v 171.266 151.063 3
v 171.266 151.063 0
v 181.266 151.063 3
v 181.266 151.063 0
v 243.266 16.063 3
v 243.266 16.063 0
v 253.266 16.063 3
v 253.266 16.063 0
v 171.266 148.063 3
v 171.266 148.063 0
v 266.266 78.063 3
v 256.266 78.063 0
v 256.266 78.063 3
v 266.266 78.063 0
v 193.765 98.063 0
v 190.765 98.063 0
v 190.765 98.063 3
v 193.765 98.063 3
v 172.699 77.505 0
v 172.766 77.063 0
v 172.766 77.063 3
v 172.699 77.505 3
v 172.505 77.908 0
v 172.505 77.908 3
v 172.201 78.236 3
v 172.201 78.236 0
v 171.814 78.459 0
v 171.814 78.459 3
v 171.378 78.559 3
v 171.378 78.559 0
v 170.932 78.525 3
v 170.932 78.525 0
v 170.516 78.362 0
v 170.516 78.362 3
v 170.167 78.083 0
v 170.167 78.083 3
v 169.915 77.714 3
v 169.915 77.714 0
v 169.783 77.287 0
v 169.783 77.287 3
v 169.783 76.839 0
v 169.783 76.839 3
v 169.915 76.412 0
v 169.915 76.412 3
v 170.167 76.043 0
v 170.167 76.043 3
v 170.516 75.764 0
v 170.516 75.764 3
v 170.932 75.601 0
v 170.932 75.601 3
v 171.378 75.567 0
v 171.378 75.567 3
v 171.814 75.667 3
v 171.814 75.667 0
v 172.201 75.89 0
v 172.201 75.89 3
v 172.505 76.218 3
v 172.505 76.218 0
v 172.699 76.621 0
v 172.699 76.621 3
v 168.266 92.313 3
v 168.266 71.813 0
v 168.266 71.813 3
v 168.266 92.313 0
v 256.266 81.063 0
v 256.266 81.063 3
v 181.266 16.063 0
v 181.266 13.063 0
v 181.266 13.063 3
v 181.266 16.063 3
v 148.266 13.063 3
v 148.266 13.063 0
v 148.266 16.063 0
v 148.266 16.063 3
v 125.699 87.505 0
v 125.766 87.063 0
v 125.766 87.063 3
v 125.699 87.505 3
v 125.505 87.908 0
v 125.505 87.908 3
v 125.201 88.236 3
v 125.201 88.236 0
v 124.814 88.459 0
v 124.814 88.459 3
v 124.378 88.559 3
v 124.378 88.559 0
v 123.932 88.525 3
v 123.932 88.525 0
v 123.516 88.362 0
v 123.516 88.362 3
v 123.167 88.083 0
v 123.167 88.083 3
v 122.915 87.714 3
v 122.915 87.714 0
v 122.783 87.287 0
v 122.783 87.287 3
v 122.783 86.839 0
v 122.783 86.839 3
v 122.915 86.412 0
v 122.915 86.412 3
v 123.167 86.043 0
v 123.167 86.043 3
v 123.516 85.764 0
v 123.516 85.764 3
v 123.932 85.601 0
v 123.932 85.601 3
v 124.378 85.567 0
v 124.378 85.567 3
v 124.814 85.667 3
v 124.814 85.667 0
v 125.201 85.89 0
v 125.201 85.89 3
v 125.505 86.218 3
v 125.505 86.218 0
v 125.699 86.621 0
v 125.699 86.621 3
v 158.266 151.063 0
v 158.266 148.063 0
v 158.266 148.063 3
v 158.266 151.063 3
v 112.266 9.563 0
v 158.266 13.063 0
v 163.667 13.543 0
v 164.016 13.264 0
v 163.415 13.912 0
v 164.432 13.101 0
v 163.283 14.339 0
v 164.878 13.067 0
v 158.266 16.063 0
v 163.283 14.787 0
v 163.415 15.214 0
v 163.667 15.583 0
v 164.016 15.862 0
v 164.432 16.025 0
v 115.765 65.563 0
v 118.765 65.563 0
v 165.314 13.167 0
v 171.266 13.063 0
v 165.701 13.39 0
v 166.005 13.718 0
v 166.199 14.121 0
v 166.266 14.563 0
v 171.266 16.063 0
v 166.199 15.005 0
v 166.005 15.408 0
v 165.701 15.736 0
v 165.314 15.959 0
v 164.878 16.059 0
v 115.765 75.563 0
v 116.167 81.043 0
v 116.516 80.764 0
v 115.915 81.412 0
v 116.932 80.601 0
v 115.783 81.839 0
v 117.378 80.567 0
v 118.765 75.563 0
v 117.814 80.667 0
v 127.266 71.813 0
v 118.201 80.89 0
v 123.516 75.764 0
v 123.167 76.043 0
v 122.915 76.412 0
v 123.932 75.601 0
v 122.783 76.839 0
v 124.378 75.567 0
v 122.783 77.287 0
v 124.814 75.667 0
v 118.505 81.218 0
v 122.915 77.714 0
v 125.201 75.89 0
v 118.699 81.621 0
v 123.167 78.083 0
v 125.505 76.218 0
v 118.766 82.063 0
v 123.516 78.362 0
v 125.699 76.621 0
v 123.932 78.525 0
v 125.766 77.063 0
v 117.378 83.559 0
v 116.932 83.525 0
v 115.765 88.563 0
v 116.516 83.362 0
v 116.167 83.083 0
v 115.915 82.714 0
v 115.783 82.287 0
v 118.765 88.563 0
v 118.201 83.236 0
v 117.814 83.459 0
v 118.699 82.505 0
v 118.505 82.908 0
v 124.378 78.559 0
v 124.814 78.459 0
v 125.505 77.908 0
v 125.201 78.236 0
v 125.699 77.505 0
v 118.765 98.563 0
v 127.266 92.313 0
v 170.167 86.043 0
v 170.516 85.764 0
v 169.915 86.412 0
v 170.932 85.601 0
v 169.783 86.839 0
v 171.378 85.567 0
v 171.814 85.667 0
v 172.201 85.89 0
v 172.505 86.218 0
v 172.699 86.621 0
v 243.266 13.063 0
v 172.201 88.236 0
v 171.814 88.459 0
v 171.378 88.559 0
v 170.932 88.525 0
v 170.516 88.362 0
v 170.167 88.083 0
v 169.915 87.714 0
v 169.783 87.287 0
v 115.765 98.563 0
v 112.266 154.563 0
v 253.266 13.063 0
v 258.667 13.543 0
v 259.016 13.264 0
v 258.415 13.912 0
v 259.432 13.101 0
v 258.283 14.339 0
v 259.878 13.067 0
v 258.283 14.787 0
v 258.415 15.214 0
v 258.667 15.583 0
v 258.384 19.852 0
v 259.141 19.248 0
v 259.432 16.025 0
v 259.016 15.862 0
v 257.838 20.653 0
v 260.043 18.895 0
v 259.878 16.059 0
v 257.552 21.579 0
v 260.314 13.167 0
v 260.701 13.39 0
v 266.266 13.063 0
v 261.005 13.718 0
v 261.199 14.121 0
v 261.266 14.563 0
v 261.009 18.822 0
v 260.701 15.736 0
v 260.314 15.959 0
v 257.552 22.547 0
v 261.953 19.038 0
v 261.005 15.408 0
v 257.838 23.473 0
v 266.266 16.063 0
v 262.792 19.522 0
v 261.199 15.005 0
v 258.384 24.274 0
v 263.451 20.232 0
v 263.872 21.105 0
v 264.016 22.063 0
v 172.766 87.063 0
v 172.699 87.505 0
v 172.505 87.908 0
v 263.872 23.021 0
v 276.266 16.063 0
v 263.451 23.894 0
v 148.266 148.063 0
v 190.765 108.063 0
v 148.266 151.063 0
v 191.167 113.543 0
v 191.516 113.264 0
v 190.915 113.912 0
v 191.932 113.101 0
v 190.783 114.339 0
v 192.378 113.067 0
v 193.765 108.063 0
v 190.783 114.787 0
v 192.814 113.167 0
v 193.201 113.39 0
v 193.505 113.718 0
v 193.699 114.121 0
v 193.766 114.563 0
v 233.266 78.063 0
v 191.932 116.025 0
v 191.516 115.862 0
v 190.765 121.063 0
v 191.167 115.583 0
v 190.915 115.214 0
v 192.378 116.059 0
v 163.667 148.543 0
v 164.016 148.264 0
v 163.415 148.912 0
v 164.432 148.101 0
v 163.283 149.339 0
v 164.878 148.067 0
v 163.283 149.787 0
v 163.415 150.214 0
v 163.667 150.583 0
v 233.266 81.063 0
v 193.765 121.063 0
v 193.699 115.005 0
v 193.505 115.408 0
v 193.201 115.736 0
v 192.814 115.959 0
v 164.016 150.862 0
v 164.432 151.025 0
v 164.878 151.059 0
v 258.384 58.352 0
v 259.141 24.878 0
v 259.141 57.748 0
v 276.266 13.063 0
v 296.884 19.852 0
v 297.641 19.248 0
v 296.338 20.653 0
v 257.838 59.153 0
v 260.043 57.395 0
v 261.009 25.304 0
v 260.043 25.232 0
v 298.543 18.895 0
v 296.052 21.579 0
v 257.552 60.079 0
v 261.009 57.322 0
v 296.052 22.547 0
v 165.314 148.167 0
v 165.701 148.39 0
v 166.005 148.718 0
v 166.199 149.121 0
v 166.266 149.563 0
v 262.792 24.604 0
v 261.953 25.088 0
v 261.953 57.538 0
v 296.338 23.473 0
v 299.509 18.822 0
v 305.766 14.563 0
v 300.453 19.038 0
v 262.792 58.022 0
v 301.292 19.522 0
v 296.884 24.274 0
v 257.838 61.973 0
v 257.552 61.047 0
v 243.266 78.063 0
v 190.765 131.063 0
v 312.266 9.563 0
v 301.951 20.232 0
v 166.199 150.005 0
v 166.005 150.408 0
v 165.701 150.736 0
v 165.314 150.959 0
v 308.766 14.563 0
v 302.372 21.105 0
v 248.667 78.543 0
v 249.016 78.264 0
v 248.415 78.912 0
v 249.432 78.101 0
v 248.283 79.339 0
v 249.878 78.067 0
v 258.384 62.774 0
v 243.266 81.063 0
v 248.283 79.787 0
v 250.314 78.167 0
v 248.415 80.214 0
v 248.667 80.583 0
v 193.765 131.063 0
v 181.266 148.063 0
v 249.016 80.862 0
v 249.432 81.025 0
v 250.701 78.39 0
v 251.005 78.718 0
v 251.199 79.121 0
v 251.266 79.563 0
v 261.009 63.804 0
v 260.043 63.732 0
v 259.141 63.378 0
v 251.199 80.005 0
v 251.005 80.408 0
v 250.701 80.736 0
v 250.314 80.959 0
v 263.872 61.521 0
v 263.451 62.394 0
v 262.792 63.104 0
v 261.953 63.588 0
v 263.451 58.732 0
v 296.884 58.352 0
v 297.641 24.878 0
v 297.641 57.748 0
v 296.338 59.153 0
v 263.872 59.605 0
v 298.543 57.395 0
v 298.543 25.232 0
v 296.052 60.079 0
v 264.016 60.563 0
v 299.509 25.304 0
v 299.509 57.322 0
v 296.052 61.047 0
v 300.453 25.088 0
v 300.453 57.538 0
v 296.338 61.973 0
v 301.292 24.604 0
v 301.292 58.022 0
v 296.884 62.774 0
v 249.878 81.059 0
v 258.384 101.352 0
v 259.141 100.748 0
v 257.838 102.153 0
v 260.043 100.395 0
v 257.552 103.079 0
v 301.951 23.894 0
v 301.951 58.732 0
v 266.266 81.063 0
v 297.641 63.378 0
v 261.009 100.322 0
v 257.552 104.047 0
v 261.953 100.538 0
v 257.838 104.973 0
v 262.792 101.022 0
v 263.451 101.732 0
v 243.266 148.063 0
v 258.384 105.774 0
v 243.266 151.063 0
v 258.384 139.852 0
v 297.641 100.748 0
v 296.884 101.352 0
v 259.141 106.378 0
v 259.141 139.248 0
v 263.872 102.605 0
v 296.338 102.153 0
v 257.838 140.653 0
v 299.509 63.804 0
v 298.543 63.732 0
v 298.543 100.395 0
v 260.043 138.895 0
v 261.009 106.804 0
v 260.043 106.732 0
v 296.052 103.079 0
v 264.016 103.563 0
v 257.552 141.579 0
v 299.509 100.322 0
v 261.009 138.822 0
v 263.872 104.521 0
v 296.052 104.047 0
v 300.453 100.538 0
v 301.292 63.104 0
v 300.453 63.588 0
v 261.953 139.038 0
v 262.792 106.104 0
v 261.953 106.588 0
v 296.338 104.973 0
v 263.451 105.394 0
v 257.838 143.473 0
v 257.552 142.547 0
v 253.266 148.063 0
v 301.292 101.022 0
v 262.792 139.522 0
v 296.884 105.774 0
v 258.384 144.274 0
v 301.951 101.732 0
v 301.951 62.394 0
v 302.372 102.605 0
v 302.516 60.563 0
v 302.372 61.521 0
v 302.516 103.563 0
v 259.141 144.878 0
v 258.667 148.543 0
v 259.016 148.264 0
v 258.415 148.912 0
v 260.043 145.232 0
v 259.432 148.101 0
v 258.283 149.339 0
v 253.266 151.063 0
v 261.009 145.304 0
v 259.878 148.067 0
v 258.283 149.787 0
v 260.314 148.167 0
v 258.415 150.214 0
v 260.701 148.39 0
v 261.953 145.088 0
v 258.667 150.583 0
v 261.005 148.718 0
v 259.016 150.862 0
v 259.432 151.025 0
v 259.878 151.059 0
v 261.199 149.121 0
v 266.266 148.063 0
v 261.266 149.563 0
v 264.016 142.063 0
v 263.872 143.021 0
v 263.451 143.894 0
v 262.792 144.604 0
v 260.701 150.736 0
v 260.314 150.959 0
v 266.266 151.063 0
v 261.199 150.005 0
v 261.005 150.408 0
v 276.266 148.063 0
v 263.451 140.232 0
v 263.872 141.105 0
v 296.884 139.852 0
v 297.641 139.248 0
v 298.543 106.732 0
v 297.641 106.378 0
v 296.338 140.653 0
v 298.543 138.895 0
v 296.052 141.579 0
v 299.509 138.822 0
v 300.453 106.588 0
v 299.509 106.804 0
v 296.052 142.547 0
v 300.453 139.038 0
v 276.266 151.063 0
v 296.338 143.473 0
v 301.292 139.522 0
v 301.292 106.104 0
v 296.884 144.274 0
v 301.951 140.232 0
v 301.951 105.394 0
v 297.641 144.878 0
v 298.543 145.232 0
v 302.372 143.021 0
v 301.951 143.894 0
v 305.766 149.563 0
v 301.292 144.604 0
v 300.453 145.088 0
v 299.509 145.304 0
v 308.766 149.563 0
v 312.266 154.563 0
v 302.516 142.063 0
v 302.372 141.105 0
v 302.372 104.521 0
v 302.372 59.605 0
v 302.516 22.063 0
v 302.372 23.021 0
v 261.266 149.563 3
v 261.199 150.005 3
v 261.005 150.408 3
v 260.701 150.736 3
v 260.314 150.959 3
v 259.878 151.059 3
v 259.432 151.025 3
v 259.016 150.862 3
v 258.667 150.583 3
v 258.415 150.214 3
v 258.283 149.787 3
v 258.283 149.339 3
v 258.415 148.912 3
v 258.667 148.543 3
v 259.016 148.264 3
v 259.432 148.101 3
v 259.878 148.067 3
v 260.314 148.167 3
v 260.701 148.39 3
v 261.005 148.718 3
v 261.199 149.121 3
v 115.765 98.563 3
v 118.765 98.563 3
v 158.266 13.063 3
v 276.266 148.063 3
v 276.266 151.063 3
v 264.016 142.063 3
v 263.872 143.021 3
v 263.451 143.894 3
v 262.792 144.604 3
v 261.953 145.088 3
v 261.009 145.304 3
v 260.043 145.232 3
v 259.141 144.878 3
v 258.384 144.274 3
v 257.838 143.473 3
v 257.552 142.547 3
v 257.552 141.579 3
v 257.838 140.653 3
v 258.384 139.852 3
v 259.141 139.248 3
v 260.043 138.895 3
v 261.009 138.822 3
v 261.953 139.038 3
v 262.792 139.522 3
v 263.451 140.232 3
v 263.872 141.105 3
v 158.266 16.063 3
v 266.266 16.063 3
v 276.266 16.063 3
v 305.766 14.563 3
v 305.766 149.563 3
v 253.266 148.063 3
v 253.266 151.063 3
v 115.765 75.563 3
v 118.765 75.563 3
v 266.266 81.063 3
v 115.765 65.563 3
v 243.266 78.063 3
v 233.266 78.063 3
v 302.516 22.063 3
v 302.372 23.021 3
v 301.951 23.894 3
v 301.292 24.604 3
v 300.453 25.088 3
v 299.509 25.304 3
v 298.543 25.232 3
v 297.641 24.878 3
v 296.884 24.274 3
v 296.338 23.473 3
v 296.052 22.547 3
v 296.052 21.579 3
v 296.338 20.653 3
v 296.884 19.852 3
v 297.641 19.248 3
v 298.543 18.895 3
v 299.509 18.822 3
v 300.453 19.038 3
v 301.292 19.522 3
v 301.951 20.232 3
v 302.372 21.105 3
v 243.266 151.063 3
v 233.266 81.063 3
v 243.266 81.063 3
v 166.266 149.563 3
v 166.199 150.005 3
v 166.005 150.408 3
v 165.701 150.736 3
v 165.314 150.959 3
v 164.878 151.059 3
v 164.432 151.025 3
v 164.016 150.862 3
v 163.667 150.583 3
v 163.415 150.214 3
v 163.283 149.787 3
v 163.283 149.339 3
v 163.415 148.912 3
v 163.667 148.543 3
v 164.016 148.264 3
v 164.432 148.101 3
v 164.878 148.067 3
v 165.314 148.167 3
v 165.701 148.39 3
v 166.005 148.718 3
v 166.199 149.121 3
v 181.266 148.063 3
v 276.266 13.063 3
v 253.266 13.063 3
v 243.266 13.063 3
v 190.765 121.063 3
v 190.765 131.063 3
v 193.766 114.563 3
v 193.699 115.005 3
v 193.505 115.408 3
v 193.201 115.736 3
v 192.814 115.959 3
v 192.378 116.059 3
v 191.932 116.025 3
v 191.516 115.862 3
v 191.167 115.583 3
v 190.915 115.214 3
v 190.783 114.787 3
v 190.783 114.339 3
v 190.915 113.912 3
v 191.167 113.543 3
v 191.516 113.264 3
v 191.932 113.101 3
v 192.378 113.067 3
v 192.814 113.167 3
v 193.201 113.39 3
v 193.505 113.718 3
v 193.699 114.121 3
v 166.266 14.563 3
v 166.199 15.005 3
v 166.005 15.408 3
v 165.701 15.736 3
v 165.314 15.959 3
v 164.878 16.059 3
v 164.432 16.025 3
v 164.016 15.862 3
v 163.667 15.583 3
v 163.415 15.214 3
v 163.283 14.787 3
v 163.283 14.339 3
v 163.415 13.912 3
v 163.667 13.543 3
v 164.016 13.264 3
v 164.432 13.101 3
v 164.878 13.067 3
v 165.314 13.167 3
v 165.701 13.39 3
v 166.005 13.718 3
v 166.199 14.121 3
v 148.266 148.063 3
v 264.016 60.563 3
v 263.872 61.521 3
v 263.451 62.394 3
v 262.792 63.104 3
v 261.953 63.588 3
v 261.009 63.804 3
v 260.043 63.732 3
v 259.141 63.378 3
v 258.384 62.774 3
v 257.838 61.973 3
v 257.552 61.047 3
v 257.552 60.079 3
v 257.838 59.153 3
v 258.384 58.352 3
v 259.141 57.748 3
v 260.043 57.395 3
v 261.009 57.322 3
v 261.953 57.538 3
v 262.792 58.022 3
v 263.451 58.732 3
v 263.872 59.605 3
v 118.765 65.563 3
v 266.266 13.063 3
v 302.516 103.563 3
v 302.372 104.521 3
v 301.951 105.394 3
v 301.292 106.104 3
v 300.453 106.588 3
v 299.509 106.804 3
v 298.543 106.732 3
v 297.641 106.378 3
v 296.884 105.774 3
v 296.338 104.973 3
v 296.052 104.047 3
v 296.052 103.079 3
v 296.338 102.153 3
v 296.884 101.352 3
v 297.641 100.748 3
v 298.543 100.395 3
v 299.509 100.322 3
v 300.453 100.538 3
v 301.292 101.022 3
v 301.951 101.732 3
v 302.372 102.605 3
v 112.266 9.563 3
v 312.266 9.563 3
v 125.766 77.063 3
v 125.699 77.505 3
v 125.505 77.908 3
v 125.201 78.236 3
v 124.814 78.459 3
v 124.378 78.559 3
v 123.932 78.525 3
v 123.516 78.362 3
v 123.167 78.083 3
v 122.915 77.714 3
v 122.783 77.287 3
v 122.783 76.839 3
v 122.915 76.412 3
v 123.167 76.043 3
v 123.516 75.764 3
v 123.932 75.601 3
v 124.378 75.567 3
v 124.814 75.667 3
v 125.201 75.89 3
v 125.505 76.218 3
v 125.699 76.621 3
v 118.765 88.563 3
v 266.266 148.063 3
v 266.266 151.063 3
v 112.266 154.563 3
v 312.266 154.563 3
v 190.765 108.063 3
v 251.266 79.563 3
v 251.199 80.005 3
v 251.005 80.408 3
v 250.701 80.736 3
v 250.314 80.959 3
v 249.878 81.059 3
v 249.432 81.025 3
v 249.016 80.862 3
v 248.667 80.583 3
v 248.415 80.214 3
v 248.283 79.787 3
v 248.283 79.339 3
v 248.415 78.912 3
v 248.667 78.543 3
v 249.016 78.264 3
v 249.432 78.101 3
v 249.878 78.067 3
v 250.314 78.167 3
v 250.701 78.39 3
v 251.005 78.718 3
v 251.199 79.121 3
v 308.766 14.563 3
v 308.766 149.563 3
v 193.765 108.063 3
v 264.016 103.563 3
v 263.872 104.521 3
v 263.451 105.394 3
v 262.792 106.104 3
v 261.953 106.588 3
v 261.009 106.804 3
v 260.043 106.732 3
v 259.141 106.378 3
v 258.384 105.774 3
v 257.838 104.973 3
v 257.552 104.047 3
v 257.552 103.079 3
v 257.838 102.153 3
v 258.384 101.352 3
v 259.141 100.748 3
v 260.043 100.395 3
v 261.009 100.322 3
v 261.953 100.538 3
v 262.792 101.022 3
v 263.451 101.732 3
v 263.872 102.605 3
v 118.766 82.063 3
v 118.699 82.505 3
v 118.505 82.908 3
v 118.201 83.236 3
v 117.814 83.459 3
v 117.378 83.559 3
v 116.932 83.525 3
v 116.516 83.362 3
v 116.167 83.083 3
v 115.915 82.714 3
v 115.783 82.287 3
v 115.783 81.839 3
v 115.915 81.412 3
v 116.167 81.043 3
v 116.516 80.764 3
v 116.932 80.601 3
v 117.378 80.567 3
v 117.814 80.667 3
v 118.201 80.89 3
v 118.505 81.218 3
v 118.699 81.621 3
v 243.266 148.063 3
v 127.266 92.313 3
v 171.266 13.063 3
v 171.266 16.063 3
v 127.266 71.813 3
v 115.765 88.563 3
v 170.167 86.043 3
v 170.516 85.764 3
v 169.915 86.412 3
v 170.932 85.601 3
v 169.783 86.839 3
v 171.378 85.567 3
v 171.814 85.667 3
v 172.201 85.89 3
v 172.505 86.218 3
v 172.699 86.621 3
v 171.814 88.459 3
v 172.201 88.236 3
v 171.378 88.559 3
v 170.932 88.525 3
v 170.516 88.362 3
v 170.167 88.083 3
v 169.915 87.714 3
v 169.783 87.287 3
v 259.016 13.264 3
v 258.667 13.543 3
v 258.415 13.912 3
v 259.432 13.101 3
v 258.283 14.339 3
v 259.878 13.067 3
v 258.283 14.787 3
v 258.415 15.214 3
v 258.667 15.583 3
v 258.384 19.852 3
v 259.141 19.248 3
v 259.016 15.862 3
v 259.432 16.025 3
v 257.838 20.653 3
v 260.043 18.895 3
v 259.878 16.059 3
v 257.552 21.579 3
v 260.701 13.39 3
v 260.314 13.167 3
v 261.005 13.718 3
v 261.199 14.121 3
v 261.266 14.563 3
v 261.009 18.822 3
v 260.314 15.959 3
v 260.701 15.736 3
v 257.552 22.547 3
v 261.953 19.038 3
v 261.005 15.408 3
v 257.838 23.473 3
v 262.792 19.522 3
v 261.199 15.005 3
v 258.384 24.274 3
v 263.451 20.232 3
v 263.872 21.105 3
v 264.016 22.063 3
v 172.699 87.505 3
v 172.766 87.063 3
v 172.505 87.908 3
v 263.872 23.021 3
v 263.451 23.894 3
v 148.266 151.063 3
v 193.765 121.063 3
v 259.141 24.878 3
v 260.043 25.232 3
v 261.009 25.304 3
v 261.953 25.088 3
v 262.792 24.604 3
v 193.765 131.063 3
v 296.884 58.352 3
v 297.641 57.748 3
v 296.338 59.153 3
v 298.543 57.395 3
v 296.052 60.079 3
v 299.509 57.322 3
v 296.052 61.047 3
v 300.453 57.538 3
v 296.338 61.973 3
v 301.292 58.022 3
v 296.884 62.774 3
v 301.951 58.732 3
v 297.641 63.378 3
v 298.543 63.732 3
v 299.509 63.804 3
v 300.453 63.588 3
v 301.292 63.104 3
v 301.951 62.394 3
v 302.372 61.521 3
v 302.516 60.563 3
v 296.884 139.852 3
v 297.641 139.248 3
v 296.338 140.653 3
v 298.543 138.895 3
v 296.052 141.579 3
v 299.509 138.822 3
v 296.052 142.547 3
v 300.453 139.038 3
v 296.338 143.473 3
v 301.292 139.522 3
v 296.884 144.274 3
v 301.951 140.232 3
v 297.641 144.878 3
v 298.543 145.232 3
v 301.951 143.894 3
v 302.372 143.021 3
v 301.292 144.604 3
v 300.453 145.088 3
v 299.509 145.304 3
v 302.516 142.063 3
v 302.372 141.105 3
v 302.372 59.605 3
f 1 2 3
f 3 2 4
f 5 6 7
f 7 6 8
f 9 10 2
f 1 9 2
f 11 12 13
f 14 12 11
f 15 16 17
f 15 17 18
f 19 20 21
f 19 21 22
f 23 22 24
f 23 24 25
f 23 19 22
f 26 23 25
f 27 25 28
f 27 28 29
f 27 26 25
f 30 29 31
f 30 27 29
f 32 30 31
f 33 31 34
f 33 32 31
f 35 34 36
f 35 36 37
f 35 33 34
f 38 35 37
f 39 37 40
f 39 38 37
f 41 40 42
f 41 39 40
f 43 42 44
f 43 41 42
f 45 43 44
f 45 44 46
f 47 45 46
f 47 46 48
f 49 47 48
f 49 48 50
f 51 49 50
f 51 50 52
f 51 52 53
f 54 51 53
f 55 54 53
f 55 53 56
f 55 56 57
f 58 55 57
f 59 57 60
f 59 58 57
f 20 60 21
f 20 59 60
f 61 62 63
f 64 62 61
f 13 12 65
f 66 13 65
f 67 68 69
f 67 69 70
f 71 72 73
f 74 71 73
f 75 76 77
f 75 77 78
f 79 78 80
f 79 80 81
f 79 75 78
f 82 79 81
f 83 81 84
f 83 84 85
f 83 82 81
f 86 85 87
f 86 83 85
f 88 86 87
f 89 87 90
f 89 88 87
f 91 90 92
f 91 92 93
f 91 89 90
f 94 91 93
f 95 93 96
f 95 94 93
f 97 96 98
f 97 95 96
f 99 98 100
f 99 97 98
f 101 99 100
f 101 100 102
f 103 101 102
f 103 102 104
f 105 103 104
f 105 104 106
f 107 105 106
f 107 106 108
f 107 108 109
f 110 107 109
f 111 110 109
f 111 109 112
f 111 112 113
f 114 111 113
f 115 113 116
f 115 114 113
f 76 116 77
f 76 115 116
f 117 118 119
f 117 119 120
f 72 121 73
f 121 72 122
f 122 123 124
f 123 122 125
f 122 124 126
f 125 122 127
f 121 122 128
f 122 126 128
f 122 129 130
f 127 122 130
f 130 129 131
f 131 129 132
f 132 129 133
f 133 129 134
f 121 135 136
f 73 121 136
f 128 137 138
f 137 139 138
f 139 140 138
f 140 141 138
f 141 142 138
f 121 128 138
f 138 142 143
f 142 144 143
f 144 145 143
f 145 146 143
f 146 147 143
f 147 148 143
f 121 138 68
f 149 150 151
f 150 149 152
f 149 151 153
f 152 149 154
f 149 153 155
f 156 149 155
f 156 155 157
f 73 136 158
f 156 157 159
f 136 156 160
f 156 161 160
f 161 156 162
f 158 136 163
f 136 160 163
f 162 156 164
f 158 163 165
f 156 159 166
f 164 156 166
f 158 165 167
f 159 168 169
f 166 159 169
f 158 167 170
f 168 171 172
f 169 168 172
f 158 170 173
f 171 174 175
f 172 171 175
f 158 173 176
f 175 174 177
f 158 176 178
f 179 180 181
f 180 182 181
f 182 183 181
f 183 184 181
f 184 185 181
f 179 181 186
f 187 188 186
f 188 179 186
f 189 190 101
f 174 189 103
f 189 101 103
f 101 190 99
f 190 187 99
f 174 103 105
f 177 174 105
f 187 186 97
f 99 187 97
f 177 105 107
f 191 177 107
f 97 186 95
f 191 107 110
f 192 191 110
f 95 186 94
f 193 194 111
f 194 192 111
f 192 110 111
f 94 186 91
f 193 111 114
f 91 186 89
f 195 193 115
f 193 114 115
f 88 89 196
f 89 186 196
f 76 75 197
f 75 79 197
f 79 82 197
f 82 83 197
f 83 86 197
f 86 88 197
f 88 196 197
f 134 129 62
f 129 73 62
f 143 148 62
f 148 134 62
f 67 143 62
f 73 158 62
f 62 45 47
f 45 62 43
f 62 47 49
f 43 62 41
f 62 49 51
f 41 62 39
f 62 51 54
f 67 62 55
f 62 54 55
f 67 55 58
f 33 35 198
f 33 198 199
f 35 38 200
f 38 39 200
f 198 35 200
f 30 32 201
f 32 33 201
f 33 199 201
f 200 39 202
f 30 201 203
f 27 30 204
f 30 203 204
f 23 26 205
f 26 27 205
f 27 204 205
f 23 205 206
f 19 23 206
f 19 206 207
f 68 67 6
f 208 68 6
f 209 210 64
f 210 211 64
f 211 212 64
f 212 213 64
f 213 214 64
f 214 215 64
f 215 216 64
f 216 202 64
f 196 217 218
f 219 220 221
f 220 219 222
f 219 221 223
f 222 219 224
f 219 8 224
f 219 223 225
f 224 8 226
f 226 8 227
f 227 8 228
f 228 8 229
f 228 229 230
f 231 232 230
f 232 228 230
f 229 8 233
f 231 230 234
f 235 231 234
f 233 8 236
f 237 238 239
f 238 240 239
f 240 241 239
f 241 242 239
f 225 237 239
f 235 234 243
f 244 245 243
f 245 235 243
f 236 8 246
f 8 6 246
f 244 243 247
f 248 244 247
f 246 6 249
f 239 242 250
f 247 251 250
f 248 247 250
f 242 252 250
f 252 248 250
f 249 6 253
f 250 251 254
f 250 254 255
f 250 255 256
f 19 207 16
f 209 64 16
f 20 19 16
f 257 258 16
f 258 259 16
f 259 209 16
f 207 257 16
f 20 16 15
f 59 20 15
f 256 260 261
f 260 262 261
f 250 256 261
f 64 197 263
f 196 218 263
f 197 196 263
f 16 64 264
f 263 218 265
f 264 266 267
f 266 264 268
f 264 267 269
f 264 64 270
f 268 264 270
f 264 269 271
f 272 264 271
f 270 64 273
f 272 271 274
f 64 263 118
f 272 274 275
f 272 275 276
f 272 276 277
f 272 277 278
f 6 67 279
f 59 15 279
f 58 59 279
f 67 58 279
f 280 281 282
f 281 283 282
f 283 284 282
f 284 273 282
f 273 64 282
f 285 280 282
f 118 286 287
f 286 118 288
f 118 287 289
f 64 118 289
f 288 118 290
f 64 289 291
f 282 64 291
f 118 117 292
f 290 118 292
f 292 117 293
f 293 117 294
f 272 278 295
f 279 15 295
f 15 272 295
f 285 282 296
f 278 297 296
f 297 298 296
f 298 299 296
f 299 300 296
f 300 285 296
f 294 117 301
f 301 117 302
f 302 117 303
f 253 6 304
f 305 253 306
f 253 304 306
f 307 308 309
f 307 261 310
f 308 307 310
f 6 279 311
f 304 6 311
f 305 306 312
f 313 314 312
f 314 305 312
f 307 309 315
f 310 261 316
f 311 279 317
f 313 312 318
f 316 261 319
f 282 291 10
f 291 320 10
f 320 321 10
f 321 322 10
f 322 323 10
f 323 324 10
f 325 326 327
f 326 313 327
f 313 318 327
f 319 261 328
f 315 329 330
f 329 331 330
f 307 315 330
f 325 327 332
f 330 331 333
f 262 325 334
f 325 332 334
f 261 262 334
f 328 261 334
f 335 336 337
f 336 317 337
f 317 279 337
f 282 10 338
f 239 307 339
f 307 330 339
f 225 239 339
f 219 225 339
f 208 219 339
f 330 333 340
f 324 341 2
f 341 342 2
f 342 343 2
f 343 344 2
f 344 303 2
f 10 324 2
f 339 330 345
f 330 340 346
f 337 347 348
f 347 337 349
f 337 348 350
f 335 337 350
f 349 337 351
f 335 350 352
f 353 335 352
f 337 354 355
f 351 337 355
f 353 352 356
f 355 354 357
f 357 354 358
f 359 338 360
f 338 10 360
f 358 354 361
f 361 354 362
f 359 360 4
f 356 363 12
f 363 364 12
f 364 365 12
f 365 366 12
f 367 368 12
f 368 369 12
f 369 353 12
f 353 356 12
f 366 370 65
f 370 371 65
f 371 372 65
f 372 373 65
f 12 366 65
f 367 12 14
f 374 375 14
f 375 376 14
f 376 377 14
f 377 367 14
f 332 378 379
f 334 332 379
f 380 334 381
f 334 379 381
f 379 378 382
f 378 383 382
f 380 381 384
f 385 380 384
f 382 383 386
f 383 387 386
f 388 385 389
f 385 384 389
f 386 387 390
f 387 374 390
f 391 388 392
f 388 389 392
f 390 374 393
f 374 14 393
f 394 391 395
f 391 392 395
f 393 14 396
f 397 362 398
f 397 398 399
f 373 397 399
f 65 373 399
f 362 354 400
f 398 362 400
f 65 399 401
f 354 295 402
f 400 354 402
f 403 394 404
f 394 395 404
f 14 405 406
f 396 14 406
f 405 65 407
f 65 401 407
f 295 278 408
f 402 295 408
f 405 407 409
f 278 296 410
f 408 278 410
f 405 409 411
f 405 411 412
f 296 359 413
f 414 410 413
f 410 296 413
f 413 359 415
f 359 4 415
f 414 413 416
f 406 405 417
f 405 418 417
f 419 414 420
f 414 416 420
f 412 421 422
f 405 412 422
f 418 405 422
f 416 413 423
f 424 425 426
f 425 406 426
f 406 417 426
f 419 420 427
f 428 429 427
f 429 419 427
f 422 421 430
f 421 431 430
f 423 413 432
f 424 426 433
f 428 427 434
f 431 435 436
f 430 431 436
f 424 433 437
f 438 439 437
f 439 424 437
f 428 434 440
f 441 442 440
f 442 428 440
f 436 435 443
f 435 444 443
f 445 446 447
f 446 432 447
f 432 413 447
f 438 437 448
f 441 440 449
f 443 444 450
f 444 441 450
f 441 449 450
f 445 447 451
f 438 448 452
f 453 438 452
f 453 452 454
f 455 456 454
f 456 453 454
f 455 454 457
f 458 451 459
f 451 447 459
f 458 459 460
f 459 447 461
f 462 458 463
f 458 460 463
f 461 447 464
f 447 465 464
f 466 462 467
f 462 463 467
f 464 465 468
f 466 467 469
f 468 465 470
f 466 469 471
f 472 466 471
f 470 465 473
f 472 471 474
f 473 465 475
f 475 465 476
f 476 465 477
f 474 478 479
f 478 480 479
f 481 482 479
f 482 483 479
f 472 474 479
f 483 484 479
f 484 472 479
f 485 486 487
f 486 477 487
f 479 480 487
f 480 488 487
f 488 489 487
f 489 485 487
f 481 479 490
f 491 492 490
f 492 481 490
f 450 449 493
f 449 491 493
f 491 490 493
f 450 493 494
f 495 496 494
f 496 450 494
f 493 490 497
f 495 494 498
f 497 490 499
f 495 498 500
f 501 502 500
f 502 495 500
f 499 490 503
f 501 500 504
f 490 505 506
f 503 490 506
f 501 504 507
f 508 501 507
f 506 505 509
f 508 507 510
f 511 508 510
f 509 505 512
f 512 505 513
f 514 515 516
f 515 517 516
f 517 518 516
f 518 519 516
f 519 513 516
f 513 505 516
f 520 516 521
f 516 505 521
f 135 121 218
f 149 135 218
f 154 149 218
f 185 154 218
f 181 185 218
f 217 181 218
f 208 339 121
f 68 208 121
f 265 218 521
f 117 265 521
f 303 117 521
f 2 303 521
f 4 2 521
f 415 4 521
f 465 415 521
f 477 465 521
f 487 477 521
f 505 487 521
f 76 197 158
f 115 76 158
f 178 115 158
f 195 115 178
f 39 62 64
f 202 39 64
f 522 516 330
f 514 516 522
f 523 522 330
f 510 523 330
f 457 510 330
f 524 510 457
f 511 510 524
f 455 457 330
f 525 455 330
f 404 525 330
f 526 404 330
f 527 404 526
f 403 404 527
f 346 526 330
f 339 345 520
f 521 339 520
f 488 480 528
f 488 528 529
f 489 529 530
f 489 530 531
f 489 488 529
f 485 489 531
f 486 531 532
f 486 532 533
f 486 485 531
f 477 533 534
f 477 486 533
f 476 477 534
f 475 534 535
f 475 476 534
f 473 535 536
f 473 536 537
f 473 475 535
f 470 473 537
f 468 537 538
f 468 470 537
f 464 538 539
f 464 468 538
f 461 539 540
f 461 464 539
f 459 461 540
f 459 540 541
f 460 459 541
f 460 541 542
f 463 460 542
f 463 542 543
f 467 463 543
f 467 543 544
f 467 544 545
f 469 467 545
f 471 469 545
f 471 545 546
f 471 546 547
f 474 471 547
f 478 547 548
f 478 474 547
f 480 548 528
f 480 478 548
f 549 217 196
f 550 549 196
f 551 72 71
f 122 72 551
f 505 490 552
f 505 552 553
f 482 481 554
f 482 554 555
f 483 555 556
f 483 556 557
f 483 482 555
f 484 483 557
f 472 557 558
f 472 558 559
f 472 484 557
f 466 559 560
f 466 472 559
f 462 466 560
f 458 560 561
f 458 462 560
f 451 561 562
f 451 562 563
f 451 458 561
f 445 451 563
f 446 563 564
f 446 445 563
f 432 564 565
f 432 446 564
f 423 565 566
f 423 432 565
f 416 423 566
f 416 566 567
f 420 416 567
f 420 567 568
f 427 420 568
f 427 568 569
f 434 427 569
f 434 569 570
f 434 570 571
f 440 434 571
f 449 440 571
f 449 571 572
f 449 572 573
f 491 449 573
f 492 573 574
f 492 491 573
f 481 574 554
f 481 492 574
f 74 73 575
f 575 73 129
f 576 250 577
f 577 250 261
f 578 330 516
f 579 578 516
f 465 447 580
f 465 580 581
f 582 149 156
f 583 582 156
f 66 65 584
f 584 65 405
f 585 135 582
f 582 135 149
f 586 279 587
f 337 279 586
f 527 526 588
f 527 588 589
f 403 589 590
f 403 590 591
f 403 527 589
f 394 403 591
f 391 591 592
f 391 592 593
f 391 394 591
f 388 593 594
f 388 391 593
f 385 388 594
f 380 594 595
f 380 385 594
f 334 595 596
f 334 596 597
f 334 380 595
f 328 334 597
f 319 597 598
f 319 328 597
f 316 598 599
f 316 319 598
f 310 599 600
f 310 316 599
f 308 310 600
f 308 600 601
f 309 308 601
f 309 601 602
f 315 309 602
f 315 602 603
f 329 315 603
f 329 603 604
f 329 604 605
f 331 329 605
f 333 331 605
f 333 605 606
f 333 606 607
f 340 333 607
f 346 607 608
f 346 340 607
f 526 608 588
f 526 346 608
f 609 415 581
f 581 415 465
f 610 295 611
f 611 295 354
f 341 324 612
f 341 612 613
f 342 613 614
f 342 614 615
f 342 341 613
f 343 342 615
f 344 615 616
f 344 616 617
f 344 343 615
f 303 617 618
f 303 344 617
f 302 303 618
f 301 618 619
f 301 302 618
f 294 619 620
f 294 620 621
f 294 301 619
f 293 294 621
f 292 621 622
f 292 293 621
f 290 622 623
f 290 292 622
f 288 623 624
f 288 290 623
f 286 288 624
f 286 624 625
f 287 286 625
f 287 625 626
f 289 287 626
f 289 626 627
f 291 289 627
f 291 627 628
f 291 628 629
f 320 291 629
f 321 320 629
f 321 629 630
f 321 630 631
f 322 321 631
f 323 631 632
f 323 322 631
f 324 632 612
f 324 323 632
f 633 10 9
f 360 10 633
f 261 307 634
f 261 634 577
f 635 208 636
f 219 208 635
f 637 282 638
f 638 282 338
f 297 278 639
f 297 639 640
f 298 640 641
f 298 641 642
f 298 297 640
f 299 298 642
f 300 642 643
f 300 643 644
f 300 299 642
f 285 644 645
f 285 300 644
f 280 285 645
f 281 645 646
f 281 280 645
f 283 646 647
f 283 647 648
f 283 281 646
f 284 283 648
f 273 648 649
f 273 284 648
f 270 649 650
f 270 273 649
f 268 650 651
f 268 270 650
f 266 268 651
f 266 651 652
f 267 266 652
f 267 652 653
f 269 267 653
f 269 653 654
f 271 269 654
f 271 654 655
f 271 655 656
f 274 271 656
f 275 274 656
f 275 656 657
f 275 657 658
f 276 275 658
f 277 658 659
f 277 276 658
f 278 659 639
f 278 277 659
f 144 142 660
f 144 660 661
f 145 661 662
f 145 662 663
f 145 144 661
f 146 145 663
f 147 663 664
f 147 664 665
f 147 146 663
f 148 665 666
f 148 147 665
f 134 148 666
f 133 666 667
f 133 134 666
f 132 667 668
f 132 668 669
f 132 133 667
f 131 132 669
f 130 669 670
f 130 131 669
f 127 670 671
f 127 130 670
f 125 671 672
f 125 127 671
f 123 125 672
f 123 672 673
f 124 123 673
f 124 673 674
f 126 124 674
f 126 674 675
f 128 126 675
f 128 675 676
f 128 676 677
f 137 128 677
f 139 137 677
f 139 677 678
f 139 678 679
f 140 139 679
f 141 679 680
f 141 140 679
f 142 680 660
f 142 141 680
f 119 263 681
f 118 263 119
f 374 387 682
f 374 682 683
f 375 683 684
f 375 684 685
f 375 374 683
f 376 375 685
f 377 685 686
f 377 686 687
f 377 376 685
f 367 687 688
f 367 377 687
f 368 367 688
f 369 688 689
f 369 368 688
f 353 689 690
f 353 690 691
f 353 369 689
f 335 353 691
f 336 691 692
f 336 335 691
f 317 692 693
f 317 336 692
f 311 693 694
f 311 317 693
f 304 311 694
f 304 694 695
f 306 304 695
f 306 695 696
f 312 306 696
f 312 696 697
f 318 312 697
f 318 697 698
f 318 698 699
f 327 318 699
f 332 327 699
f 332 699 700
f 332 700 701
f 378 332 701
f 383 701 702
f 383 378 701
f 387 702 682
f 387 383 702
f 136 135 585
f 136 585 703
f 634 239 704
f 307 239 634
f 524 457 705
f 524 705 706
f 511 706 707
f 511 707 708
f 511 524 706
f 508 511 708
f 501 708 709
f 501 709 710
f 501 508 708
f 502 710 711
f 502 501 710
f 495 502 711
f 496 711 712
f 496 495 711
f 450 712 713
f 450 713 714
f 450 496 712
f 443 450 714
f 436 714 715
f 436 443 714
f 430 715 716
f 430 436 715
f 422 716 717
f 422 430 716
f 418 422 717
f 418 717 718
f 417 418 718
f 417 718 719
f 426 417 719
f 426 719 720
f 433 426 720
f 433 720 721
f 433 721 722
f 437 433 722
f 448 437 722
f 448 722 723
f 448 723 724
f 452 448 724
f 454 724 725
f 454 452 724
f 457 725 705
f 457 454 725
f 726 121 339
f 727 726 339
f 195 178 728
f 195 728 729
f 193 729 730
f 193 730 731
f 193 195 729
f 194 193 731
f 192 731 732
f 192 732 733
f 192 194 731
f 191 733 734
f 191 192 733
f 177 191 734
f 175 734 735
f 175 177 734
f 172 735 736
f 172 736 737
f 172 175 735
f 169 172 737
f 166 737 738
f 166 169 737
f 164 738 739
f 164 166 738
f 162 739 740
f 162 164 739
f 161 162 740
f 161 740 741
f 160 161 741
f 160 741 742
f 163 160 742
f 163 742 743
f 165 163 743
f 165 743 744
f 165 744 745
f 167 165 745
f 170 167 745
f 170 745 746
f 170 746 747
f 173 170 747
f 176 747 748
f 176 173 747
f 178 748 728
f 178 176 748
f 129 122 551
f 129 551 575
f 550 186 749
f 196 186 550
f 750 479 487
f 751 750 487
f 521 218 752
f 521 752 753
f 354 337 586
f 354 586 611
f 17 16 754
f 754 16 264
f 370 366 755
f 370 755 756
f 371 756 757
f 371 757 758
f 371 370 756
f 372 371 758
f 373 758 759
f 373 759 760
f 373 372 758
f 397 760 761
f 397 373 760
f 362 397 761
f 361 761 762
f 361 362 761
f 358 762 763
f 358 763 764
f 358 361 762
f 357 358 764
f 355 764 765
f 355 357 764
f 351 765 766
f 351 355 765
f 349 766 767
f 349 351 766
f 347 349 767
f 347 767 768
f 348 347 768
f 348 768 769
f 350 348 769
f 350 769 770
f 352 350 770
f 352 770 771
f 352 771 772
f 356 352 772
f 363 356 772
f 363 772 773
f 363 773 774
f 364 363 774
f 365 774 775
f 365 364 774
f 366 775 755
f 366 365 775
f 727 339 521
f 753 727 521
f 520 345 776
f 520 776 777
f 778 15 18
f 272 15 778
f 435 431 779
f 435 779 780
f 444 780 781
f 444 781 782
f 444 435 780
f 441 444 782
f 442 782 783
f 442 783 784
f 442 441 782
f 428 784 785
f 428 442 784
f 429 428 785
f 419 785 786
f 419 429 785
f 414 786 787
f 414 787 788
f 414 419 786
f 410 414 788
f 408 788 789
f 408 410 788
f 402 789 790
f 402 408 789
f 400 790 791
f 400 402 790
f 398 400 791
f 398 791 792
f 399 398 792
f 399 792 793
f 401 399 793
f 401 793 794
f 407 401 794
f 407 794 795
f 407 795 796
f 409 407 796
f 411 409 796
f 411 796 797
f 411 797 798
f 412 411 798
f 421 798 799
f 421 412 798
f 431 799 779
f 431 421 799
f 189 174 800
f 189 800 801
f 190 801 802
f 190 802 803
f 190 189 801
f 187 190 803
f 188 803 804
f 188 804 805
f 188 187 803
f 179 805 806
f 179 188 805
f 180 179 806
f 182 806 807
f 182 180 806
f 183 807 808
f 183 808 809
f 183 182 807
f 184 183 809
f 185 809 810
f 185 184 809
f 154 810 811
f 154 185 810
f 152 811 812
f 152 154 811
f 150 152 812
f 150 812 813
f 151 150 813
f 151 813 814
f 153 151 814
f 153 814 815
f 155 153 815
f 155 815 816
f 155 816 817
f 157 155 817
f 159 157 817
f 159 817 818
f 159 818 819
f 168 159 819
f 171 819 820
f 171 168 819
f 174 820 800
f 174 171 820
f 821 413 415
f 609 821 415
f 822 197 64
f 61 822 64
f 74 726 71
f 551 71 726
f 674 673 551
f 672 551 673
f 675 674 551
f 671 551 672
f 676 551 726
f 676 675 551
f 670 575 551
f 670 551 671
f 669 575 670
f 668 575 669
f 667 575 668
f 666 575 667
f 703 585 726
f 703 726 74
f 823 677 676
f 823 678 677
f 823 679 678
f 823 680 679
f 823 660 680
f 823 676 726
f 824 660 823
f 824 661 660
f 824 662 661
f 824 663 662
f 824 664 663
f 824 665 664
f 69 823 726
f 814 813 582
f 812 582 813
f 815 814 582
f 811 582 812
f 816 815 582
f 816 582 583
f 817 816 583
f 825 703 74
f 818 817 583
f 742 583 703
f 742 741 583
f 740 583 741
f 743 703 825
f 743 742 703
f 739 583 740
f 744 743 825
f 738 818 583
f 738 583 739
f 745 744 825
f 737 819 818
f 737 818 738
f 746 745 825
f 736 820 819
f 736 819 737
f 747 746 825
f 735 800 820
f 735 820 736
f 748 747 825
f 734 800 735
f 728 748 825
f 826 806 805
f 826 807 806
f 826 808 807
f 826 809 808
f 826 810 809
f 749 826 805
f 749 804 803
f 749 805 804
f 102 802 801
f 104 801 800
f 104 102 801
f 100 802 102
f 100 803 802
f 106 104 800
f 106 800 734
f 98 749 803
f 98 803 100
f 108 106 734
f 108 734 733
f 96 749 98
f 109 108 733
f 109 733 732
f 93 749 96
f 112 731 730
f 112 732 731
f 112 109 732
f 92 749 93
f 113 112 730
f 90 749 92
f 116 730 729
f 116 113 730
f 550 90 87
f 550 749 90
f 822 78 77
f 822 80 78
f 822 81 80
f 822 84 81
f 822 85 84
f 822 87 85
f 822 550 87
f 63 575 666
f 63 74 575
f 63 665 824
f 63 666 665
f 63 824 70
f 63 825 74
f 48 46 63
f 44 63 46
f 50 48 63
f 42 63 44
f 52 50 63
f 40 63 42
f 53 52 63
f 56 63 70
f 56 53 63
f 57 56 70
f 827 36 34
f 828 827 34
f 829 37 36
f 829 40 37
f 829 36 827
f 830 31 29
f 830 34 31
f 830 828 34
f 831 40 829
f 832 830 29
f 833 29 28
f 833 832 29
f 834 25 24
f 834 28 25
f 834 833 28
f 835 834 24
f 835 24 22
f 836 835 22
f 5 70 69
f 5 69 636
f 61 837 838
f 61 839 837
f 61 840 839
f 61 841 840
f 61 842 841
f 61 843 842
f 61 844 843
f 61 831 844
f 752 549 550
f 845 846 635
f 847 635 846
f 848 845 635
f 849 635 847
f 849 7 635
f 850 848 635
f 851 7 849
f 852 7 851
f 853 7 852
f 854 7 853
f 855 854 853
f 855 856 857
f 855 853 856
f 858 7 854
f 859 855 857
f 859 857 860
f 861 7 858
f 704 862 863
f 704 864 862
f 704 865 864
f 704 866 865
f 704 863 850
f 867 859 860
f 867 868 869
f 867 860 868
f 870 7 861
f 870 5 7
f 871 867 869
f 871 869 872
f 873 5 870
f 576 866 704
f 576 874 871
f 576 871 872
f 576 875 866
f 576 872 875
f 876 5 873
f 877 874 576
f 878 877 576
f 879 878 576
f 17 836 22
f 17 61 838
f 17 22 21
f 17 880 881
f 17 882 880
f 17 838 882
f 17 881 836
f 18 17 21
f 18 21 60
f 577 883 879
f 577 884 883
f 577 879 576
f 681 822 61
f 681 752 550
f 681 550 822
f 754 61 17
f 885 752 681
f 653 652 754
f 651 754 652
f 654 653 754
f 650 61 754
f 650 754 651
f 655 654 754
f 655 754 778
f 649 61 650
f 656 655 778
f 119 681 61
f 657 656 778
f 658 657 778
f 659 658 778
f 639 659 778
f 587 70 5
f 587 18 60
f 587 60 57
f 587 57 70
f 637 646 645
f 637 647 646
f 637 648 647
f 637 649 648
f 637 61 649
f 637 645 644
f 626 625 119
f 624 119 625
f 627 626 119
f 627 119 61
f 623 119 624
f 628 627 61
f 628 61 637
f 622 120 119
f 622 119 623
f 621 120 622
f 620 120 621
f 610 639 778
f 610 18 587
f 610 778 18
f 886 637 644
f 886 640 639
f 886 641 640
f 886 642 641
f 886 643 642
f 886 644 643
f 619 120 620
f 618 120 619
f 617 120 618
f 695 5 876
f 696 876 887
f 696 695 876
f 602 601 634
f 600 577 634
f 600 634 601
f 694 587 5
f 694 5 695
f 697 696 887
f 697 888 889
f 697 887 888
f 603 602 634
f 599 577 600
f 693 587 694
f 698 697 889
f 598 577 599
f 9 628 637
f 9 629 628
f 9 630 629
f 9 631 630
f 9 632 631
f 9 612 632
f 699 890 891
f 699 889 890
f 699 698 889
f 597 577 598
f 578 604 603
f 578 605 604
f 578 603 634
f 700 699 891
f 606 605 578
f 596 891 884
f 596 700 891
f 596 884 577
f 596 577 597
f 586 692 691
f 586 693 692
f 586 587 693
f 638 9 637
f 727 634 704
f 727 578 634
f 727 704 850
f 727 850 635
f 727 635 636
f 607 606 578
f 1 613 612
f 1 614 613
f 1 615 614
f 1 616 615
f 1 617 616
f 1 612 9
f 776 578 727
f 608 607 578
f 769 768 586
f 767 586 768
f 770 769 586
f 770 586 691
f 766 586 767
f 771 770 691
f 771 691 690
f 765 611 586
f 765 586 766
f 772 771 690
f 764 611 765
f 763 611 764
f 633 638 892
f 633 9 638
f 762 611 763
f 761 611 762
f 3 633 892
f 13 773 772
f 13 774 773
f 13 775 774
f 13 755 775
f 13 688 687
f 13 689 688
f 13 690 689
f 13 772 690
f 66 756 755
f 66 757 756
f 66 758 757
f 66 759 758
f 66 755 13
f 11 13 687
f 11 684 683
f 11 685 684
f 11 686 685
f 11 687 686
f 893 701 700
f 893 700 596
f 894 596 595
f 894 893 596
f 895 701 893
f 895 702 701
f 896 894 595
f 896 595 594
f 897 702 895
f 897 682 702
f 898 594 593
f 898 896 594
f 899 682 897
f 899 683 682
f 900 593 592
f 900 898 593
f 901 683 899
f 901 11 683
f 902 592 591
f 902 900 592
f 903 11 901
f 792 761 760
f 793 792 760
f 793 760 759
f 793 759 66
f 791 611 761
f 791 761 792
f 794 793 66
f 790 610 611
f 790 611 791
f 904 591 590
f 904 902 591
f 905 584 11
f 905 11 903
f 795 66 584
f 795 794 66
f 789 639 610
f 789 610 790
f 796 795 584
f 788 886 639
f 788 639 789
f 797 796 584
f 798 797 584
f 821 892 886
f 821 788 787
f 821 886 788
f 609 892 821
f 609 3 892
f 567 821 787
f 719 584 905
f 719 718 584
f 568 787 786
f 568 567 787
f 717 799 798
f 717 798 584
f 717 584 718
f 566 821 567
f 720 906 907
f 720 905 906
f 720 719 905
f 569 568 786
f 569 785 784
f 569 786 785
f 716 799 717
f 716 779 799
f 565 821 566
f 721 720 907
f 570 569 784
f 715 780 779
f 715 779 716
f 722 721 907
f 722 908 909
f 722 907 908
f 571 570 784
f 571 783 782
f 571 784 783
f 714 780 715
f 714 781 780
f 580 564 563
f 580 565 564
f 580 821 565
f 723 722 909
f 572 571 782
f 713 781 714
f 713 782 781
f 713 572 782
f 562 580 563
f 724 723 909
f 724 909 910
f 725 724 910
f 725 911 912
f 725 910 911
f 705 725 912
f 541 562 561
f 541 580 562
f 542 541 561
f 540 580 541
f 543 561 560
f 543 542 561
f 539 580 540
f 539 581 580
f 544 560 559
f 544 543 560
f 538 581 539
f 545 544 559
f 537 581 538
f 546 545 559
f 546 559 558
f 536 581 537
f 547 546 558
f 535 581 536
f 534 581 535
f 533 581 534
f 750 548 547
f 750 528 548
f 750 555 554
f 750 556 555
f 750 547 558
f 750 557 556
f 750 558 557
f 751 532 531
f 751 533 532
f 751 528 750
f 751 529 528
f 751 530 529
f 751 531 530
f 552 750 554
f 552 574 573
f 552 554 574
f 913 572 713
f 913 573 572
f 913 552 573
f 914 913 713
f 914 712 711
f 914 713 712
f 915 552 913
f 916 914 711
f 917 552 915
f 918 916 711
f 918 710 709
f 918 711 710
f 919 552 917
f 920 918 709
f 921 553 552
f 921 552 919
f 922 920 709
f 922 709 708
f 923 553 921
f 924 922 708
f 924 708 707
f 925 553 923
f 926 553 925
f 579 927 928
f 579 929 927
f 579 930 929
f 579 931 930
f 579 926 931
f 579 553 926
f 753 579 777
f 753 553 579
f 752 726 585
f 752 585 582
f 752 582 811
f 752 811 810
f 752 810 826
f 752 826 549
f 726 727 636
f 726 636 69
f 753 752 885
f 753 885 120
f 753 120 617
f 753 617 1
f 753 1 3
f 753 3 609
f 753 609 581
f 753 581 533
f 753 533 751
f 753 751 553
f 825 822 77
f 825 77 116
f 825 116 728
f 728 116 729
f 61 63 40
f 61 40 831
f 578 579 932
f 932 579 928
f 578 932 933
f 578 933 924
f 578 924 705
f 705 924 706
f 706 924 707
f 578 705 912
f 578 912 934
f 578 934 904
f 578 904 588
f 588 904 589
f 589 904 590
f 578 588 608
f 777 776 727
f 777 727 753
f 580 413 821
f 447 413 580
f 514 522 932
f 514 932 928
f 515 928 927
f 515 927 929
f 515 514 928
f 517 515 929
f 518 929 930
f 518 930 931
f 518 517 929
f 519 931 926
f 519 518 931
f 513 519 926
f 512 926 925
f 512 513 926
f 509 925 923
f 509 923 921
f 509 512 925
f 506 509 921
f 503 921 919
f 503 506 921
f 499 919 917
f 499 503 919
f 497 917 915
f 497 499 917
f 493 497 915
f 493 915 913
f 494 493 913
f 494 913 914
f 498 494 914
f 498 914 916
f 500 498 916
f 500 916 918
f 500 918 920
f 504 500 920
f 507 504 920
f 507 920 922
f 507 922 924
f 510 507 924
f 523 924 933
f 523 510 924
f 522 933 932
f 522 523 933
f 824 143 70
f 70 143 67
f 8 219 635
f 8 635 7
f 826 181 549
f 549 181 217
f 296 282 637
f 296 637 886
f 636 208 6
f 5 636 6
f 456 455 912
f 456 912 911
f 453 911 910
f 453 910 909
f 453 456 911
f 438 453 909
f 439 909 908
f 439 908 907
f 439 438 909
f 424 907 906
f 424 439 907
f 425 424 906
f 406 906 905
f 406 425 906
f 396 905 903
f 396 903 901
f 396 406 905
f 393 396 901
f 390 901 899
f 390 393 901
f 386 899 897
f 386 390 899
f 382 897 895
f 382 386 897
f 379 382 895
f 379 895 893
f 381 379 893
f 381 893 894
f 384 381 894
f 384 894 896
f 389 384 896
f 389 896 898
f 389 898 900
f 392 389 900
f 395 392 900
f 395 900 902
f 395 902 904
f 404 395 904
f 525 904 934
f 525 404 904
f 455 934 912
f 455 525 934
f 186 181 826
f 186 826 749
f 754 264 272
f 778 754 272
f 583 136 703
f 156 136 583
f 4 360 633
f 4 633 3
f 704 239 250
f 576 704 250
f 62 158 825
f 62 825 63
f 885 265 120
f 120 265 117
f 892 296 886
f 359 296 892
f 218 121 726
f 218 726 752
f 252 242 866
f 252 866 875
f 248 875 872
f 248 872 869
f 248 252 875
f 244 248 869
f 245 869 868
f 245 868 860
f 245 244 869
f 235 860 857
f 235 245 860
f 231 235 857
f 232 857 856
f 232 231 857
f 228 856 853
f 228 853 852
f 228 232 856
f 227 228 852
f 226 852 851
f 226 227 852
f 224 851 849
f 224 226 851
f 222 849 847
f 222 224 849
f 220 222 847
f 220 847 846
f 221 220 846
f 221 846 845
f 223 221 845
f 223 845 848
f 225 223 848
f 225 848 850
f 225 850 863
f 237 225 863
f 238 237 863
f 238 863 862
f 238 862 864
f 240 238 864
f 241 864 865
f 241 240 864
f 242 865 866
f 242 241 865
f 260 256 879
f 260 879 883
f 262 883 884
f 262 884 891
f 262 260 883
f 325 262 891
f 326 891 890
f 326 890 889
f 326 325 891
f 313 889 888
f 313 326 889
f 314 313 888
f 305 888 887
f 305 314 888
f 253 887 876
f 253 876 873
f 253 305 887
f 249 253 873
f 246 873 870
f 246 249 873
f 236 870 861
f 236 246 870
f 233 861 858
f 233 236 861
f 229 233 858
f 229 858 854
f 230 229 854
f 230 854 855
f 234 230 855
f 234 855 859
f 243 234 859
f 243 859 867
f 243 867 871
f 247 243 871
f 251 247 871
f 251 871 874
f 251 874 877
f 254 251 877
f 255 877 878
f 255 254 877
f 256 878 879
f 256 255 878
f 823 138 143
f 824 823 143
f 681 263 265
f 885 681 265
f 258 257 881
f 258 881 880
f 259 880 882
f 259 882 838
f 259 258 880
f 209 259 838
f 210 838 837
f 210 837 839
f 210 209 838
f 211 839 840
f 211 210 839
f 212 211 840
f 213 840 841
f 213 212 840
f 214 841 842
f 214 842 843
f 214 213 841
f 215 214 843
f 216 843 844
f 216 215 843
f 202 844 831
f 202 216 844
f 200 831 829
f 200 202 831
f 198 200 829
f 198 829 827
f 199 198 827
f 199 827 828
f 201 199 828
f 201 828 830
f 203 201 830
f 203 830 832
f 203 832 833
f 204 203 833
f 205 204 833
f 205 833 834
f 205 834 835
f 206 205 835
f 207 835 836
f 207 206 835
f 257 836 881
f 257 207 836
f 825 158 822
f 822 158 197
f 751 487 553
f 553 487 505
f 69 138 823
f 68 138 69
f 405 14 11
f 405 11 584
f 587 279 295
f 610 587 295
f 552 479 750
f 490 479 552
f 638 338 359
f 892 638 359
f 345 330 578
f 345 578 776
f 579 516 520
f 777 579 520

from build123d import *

# Parameters (mm, degrees)
F0_W     = 200
F0_H     = 145
F0_W_2   = 10
F0_H_2   = 3
F0_R     = 1.5
F0_W_3   = 3
F0_H_3   = 10
F0_R_2   = 3.25
F0_H_4   = 135
F0_W_4   = 41
F0_H_5   = 20.5
F1_DEPTH = 3


with BuildPart() as f1:
    # F0 (on Top) → F1 (new body)
    with BuildSketch(Plane.XY):
        with Locations((212.266122, 82.063026)):
            Rectangle(F0_W, F0_H)
        with Locations((153.266122, 14.563026)):
            Rectangle(F0_W_2, F0_H_2, mode=Mode.SUBTRACT)
        with Locations((164.766122, 14.563026)):
            Circle(F0_R, mode=Mode.SUBTRACT)
        with Locations((176.266122, 14.563026)):
            Rectangle(F0_W_2, F0_H_2, mode=Mode.SUBTRACT)
        with Locations((117.264537, 70.563026)):
            Rectangle(F0_W_3, F0_H_3, mode=Mode.SUBTRACT)
        with Locations((124.266122, 77.063026)):
            Circle(F0_R, mode=Mode.SUBTRACT)
        with Locations((171.266122, 77.063026)):
            Circle(F0_R, mode=Mode.SUBTRACT)
        with Locations((248.266122, 14.563026)):
            Rectangle(F0_W_2, F0_H_2, mode=Mode.SUBTRACT)
        with Locations((259.766122, 14.563026)):
            Circle(F0_R, mode=Mode.SUBTRACT)
        with Locations((260.766122, 22.063026)):
            Circle(F0_R_2, mode=Mode.SUBTRACT)
        with Locations((271.266122, 14.563026)):
            Rectangle(F0_W_2, F0_H_2, mode=Mode.SUBTRACT)
        with Locations((299.266122, 22.063026)):
            Circle(F0_R_2, mode=Mode.SUBTRACT)
        with Locations((260.766122, 60.563026)):
            Circle(F0_R_2, mode=Mode.SUBTRACT)
        with Locations((238.266122, 79.563026)):
            Rectangle(F0_W_2, F0_H_2, mode=Mode.SUBTRACT)
        with Locations((249.766122, 79.563026)):
            Circle(F0_R, mode=Mode.SUBTRACT)
        with Locations((261.266122, 79.563026)):
            Rectangle(F0_W_2, F0_H_2, mode=Mode.SUBTRACT)
        with Locations((299.266122, 60.563026)):
            Circle(F0_R_2, mode=Mode.SUBTRACT)
        with Locations((307.266122, 82.063026)):
            Rectangle(F0_W_3, F0_H_4, mode=Mode.SUBTRACT)
        with Locations((117.266122, 82.063026)):
            Circle(F0_R, mode=Mode.SUBTRACT)
        with Locations((124.266122, 87.063026)):
            Circle(F0_R, mode=Mode.SUBTRACT)
        with Locations((117.264537, 93.563026)):
            Rectangle(F0_W_3, F0_H_3, mode=Mode.SUBTRACT)
        with Locations((147.766122, 82.063026)):
            Rectangle(F0_W_4, F0_H_5, mode=Mode.SUBTRACT)
        with Locations((171.266122, 87.063026)):
            Circle(F0_R, mode=Mode.SUBTRACT)
        with Locations((192.264537, 103.063026)):
            Rectangle(F0_W_3, F0_H_3, mode=Mode.SUBTRACT)
        with Locations((192.266122, 114.563026)):
            Circle(F0_R, mode=Mode.SUBTRACT)
        with Locations((153.266122, 149.563026)):
            Rectangle(F0_W_2, F0_H_2, mode=Mode.SUBTRACT)
        with Locations((192.264537, 126.063026)):
            Rectangle(F0_W_3, F0_H_3, mode=Mode.SUBTRACT)
        with Locations((164.766122, 149.563026)):
            Circle(F0_R, mode=Mode.SUBTRACT)
        with Locations((176.266122, 149.563026)):
            Rectangle(F0_W_2, F0_H_2, mode=Mode.SUBTRACT)
        with Locations((260.766122, 103.563026)):
            Circle(F0_R_2, mode=Mode.SUBTRACT)
        with Locations((299.266122, 103.563026)):
            Circle(F0_R_2, mode=Mode.SUBTRACT)
        with Locations((260.766122, 142.063026)):
            Circle(F0_R_2, mode=Mode.SUBTRACT)
        with Locations((248.266122, 149.563026)):
            Rectangle(F0_W_2, F0_H_2, mode=Mode.SUBTRACT)
        with Locations((259.766122, 149.563026)):
            Circle(F0_R, mode=Mode.SUBTRACT)
        with Locations((271.266122, 149.563026)):
            Rectangle(F0_W_2, F0_H_2, mode=Mode.SUBTRACT)
        with Locations((299.266122, 142.063026)):
            Circle(F0_R_2, mode=Mode.SUBTRACT)
    extrude(amount=F1_DEPTH)


solid = f1.part
